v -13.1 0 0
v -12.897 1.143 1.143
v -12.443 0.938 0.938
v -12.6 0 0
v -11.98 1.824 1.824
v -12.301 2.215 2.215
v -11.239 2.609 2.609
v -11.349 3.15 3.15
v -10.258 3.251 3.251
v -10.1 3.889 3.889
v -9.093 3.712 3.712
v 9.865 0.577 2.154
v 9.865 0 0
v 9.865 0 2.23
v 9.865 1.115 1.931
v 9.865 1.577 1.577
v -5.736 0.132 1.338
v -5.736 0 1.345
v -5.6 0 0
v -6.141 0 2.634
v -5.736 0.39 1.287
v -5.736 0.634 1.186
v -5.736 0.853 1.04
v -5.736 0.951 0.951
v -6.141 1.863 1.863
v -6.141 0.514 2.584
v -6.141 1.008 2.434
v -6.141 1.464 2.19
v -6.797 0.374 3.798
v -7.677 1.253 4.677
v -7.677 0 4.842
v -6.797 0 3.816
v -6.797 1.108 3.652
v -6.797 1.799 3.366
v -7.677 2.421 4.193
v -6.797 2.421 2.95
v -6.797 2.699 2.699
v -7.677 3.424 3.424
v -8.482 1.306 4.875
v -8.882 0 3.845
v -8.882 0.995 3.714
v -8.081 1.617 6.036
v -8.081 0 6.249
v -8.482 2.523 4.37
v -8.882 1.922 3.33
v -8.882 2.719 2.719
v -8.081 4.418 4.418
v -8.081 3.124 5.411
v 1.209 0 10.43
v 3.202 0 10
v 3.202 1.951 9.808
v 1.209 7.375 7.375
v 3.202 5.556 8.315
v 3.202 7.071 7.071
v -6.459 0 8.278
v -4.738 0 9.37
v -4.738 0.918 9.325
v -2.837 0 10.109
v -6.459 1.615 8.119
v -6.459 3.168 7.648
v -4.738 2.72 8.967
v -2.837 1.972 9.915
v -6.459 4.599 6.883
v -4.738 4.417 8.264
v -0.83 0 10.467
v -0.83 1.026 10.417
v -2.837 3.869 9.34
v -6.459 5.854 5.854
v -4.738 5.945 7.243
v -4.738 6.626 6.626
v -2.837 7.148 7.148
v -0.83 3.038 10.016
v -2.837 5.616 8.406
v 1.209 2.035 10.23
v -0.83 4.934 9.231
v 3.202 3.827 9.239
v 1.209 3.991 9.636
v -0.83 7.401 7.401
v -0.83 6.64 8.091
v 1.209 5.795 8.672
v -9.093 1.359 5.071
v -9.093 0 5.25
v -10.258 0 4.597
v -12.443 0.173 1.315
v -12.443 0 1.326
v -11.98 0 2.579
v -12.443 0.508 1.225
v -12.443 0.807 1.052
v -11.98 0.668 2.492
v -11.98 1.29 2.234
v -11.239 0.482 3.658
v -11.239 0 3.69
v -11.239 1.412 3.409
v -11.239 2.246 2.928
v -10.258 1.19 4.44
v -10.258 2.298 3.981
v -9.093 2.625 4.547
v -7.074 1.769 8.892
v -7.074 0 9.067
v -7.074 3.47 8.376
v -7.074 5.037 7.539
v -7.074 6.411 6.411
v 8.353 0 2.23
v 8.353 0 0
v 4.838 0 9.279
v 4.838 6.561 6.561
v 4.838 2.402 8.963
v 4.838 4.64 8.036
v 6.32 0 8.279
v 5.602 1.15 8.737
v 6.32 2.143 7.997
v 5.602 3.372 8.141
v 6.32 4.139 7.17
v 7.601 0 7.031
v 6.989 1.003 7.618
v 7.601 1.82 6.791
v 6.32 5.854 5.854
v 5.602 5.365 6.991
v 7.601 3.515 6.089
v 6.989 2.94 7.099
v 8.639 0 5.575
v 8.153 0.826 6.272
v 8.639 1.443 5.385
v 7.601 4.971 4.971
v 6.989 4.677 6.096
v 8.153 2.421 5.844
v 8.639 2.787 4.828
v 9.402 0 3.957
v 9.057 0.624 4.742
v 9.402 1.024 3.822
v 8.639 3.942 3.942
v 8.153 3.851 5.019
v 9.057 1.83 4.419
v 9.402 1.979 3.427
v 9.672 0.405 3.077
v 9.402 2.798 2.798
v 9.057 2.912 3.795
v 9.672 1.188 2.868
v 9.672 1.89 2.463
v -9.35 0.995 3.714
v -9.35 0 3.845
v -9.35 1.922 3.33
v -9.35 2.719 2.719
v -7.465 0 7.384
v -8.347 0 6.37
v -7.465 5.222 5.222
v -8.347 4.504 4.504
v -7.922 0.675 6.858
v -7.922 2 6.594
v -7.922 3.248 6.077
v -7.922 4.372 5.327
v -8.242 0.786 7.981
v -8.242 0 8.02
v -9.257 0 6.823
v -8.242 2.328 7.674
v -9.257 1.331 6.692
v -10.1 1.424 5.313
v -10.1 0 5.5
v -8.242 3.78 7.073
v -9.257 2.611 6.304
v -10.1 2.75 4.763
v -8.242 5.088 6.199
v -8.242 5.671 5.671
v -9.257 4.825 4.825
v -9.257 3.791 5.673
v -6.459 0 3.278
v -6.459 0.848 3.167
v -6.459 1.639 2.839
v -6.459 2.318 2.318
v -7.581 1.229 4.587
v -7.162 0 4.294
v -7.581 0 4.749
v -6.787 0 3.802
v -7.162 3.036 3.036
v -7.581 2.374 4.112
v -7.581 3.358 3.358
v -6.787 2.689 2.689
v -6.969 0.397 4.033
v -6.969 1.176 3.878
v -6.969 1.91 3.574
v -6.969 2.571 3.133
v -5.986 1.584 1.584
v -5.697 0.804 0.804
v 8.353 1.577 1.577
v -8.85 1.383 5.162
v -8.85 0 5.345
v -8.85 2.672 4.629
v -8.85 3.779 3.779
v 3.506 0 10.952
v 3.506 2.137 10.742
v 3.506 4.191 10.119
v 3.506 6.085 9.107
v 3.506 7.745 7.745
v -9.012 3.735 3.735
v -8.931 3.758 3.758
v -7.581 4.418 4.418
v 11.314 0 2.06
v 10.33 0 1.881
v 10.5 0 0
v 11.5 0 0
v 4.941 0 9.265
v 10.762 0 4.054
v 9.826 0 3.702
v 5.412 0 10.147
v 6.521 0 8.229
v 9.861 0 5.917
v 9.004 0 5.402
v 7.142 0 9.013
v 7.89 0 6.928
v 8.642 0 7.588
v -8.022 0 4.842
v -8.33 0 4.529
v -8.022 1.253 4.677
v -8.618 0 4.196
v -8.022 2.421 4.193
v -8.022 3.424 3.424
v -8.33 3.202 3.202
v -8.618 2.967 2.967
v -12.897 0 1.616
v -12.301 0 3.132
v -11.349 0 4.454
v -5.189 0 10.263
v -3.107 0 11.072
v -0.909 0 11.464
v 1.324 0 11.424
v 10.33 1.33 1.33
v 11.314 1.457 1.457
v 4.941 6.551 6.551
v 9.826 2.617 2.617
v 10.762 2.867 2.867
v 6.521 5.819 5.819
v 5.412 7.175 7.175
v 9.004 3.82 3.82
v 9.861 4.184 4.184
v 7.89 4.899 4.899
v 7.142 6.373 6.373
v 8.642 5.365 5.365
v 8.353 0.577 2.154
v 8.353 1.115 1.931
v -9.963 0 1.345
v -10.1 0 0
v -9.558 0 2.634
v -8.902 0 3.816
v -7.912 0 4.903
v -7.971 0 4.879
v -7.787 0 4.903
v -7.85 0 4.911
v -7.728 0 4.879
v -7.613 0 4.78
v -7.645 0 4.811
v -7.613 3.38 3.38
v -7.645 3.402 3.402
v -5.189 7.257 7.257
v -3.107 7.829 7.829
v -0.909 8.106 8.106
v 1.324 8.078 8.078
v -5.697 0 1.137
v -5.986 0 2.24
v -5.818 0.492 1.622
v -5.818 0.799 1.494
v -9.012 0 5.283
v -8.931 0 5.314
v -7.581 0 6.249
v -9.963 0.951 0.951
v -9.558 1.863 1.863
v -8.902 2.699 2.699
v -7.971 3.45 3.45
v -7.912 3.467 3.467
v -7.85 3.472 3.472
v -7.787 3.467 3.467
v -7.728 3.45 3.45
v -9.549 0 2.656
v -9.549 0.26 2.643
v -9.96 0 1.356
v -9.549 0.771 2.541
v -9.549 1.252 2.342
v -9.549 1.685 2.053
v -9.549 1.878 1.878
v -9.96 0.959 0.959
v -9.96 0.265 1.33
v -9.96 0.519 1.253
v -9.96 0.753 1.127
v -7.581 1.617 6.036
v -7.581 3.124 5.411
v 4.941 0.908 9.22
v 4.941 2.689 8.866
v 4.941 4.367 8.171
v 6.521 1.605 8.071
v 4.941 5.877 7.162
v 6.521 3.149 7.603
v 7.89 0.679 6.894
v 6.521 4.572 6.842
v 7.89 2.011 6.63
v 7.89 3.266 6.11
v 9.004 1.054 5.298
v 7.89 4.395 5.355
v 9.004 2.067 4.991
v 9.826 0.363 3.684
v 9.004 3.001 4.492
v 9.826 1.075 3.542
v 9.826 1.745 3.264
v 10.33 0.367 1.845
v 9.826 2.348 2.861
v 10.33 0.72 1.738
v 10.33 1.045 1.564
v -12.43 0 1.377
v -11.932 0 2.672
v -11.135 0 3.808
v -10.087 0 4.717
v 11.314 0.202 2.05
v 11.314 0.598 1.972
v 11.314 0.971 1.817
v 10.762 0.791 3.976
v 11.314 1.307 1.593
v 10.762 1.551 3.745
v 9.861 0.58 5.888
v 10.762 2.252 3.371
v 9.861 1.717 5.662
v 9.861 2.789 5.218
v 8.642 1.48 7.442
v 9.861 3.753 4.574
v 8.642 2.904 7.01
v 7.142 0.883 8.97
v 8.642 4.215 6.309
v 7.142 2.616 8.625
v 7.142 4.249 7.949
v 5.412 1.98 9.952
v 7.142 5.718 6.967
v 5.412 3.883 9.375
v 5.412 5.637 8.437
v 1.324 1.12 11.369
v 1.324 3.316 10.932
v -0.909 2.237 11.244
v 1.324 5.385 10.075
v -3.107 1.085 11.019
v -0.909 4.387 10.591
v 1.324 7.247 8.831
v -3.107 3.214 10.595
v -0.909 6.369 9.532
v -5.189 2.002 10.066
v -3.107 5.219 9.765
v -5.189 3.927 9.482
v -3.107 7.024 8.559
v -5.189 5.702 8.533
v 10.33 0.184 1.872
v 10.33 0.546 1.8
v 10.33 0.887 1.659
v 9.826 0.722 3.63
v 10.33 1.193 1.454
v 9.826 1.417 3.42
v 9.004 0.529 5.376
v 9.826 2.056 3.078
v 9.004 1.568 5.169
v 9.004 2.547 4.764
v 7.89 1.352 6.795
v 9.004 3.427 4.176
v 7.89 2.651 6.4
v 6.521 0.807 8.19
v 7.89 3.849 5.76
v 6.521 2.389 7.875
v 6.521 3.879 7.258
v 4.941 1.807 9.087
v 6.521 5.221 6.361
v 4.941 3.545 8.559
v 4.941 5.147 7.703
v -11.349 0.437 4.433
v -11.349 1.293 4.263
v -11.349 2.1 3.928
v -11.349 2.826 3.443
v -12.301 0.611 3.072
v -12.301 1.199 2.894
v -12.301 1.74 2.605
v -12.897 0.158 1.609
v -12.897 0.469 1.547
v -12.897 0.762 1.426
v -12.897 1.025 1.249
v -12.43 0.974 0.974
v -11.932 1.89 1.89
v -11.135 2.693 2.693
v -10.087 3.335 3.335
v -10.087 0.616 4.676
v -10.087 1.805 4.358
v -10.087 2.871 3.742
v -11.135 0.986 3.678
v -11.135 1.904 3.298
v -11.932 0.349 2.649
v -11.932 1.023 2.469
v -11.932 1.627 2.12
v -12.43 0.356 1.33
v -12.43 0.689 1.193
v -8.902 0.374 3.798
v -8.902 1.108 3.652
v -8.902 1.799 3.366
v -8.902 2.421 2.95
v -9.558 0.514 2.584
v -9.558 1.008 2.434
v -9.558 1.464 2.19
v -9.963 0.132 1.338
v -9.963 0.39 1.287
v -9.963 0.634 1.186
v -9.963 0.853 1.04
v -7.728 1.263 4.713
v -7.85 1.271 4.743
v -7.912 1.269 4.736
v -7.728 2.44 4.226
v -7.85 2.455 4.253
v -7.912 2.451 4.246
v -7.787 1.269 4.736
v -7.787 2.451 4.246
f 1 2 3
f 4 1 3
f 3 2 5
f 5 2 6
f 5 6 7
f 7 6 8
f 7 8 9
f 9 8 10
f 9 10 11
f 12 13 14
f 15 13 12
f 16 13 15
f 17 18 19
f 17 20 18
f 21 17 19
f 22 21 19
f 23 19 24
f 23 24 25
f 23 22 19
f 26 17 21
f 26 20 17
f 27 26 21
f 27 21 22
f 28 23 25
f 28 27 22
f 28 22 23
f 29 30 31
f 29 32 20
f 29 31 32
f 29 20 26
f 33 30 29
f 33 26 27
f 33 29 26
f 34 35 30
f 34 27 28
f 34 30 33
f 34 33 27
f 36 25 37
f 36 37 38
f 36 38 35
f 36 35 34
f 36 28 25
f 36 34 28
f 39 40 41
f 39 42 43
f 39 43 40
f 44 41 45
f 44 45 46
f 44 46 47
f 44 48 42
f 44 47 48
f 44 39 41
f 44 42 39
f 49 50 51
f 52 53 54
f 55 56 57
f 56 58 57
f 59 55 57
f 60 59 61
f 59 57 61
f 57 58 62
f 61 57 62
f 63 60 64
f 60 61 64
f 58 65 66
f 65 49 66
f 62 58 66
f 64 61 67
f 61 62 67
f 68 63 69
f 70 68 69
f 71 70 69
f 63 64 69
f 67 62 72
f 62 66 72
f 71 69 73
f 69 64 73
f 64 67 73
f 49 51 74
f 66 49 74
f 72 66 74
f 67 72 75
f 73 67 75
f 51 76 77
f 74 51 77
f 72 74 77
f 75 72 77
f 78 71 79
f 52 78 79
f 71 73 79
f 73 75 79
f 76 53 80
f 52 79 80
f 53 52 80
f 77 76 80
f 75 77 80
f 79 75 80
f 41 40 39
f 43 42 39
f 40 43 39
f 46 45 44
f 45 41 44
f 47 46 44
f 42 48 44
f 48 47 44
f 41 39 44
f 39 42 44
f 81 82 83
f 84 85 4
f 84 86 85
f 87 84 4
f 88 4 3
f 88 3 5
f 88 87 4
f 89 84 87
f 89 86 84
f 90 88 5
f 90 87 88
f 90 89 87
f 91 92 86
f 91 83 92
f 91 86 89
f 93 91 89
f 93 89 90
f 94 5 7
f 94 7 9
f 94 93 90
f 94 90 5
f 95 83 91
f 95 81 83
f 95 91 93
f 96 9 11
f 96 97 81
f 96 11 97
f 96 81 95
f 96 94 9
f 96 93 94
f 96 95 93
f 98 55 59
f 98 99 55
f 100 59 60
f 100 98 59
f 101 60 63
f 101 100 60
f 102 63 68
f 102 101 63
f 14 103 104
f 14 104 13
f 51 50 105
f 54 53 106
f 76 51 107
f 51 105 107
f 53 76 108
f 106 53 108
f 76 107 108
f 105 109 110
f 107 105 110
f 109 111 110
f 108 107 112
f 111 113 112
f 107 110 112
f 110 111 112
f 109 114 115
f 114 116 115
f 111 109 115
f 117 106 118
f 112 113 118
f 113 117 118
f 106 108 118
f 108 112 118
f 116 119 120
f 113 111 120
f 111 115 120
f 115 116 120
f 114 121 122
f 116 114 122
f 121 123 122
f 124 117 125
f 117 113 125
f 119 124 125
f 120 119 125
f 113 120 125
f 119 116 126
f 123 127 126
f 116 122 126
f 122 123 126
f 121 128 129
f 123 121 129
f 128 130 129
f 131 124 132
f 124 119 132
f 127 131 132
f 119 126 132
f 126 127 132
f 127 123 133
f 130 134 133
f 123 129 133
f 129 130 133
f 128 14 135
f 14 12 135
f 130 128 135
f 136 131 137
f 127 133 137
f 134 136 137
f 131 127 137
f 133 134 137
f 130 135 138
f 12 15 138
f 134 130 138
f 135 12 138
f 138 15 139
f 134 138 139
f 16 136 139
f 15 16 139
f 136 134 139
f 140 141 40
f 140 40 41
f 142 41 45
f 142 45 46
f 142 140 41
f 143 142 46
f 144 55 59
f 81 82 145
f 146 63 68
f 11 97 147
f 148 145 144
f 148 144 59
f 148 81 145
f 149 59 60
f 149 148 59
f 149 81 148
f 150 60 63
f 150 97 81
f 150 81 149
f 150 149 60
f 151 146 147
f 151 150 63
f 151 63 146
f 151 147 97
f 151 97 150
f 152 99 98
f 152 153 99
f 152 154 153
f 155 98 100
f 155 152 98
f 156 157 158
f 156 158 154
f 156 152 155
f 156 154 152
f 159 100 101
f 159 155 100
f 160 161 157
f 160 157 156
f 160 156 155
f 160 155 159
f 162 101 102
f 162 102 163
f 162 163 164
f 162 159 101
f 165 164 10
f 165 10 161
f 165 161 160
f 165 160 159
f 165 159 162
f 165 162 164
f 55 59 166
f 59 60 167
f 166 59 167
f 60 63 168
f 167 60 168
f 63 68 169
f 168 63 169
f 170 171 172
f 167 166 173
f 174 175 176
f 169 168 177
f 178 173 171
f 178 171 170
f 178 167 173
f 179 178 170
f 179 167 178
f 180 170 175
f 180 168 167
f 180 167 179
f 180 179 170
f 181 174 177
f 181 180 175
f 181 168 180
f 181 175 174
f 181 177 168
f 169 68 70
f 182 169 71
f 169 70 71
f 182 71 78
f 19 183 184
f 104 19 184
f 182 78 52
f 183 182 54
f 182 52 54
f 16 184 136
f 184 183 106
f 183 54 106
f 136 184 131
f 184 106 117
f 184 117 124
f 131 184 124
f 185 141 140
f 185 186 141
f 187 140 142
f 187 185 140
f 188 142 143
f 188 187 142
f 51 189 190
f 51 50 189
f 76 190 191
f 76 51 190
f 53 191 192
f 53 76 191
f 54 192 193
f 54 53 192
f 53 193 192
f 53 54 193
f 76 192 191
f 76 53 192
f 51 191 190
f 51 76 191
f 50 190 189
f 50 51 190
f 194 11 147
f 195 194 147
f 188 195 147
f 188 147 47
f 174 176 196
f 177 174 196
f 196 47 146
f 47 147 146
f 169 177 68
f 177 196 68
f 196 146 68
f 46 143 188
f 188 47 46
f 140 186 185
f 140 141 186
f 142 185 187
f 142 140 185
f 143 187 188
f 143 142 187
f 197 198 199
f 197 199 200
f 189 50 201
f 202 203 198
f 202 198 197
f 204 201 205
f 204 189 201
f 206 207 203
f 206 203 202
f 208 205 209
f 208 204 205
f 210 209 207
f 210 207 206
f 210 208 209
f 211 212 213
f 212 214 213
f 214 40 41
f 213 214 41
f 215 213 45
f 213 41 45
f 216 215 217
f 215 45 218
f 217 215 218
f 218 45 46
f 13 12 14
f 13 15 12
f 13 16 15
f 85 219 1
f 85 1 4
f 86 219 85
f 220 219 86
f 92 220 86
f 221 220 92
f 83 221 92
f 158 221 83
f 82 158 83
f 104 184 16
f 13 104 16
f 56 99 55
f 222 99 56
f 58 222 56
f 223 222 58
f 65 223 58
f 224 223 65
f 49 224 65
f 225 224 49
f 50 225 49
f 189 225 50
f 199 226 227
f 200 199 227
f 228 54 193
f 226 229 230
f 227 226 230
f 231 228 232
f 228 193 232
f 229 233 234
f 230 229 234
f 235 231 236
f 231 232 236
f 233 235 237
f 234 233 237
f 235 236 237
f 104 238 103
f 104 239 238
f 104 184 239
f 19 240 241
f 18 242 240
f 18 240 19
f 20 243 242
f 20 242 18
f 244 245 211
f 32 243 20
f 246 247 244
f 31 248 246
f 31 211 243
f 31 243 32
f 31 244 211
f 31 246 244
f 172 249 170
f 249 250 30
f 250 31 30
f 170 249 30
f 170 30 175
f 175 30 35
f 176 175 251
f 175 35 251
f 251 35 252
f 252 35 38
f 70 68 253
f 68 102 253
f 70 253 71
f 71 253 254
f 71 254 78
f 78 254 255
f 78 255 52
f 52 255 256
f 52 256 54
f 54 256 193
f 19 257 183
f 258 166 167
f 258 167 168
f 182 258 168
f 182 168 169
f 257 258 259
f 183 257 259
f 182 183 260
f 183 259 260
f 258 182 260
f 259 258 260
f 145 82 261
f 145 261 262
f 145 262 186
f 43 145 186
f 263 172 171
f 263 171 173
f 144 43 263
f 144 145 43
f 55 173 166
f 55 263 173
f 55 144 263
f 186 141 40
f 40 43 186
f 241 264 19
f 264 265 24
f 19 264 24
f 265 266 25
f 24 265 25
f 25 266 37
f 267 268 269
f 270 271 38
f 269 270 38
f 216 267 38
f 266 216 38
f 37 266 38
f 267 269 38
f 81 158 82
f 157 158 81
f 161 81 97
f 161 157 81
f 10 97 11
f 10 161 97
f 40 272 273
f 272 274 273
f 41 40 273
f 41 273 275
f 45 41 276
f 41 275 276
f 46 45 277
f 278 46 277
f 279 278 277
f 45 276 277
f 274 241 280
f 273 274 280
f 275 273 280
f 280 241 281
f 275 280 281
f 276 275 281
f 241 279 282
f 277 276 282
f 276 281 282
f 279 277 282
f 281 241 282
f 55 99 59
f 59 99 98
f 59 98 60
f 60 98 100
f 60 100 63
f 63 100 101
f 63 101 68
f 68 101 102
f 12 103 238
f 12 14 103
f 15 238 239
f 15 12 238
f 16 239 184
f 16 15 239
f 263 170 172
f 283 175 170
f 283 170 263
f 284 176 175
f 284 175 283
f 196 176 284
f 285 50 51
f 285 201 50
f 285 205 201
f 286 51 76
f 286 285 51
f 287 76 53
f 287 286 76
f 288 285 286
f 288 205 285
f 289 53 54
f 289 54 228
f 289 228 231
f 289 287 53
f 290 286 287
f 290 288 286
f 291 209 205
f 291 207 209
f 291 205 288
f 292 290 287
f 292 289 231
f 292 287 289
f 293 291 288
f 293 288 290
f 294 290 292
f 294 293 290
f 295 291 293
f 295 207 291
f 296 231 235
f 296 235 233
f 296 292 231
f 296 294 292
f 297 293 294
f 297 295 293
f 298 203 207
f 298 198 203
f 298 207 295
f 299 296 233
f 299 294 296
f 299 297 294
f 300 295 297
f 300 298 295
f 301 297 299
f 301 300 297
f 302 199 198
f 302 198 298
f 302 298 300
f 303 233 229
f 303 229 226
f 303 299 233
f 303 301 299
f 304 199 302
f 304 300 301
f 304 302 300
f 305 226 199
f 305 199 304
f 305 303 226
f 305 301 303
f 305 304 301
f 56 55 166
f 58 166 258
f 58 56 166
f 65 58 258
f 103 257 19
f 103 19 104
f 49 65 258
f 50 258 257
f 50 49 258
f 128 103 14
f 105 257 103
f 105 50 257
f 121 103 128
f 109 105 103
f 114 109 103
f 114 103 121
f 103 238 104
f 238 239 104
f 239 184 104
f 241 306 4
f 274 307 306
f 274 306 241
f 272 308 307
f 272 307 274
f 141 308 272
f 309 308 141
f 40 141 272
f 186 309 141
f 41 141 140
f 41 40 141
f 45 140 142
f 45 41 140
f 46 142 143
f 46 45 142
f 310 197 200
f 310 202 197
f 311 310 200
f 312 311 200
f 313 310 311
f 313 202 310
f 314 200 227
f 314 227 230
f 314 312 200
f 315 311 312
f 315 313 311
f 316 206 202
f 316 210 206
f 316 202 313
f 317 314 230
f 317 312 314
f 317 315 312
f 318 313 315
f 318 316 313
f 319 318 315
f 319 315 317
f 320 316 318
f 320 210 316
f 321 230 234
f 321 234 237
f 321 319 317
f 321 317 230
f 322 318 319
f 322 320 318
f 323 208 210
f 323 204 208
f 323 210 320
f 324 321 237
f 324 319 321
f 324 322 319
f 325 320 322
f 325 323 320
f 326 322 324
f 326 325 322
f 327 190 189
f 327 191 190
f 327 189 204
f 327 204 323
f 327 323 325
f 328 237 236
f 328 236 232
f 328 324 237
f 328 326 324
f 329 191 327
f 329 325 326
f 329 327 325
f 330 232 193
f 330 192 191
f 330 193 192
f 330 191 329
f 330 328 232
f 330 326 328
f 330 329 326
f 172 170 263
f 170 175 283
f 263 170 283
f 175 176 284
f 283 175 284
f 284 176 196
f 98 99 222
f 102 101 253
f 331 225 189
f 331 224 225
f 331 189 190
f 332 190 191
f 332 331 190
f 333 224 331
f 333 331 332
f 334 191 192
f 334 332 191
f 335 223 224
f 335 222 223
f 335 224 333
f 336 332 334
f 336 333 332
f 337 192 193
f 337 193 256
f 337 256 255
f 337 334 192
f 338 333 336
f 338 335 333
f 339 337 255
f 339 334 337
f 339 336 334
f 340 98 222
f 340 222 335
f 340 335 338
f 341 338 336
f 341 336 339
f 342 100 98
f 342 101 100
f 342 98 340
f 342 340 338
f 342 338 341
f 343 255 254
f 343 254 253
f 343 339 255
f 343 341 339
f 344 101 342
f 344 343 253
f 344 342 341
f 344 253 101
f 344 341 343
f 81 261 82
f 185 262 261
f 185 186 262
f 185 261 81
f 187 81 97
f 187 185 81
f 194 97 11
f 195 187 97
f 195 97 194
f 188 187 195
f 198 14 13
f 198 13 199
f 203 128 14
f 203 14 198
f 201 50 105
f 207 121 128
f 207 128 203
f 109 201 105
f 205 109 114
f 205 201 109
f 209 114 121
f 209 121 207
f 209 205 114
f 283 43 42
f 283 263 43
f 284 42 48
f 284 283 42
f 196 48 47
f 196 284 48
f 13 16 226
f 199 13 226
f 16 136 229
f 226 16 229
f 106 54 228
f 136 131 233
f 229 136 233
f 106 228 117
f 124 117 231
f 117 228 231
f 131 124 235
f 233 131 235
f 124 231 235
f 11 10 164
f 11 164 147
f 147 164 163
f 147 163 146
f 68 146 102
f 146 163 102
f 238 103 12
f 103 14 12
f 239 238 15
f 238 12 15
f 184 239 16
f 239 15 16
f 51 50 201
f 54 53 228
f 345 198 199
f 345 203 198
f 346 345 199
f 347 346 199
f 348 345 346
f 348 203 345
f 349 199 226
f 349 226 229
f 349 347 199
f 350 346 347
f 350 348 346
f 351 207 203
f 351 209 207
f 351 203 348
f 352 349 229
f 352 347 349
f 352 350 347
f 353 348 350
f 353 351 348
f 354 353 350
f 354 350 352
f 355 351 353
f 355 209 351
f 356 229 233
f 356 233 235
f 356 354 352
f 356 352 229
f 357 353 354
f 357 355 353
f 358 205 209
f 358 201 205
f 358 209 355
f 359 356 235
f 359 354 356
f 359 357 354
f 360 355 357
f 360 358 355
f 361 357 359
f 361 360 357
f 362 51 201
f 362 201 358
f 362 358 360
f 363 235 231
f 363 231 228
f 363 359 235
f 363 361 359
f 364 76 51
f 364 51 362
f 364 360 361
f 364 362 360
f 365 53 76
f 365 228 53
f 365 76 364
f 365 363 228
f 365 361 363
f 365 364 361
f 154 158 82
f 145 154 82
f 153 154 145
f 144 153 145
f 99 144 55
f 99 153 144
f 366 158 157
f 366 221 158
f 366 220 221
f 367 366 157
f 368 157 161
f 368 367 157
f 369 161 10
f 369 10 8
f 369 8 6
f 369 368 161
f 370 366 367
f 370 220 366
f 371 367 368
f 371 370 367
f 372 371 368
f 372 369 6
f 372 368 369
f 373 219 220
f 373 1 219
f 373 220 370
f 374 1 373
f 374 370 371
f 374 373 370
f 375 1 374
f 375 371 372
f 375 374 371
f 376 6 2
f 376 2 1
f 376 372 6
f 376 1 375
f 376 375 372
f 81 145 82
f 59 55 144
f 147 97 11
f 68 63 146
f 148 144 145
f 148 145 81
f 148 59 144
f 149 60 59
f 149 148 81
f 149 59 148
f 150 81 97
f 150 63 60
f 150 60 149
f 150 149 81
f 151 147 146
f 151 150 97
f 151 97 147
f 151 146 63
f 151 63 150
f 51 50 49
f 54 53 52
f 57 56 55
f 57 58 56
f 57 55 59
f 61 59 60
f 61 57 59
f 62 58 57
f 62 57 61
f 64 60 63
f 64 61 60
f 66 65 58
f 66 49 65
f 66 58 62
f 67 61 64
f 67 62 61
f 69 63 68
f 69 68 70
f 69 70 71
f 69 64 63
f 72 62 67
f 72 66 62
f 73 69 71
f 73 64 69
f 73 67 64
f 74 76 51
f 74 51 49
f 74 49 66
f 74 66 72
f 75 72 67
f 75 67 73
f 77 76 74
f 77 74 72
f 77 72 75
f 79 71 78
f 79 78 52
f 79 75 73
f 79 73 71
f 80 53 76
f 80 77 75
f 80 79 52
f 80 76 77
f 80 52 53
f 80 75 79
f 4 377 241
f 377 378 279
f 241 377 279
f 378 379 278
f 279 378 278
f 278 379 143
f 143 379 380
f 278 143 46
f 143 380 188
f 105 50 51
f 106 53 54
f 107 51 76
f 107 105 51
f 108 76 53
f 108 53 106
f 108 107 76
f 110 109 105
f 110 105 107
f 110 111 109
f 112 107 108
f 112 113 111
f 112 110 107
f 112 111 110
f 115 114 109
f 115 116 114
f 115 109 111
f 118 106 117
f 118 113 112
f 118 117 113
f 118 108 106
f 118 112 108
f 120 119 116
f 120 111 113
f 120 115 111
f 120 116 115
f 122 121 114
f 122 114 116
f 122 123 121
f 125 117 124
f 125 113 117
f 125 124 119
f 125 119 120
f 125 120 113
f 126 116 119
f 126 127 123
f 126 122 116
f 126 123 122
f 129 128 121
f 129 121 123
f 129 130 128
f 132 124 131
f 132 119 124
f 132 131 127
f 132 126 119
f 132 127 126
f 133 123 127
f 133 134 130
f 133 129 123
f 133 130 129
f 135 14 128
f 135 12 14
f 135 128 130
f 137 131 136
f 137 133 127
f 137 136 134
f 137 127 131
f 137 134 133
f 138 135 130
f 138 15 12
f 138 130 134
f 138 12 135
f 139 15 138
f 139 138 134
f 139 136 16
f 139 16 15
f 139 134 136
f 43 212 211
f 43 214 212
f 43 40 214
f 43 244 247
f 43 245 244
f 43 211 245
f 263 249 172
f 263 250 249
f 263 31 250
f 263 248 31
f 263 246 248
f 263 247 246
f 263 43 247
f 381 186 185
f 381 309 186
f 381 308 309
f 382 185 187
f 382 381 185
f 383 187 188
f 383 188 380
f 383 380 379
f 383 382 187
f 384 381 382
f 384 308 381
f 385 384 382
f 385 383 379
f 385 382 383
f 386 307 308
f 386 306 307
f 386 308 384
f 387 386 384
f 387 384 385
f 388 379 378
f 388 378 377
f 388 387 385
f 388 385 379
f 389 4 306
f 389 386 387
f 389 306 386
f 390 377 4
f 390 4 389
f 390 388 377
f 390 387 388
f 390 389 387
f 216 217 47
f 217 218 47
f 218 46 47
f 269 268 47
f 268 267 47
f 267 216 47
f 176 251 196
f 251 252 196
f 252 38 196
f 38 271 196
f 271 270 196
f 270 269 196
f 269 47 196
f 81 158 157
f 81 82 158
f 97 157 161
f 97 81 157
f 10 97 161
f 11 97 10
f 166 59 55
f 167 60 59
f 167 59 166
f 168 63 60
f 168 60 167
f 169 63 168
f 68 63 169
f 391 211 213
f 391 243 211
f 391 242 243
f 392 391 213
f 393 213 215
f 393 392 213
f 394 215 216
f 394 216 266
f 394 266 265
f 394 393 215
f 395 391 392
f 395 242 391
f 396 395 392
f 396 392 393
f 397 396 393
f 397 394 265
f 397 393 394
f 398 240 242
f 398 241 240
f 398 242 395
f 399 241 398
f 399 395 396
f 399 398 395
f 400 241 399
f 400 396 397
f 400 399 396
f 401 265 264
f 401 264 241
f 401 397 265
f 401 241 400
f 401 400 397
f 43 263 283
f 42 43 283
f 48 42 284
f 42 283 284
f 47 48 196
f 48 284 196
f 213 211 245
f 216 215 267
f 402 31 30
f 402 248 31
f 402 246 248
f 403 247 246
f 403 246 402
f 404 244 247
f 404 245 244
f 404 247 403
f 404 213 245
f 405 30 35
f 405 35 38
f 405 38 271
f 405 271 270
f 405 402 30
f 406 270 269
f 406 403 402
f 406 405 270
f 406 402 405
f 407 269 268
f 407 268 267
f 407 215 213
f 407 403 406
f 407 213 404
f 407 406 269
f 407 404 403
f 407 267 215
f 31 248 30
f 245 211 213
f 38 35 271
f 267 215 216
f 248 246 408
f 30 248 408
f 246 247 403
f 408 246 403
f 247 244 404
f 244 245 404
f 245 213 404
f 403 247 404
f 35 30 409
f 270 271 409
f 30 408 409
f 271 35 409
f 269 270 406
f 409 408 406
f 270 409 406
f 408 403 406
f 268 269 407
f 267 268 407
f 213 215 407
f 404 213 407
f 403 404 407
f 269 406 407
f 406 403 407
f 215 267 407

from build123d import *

# Parameters (mm, degrees)
F1_ANGLE  = 45
F3_ANGLE  = 45
F4_ANGLE  = 45
F6_ANGLE  = 45
F7_ANGLE  = 45
F9_ANGLE  = 45
F10_ANGLE = 45
F11_W     = 1.51221
F11_H     = 2.23
F12_ANGLE = 45
F13_ANGLE = 45
F15_ANGLE = 45
F16_ANGLE = 45
F19_ANGLE = 45
F22_ANGLE = 45
F25_ANGLE = 45
F28_ANGLE = 45
F31_ANGLE = 45


with BuildPart() as f1:
    # F0 (on Front) → F1 (revolve)
    with BuildSketch(Plane.XZ):
        with BuildLine():
            Line((-11.5, 0), (11.5, 0))
            ThreePointArc((11.5, 0), (2.8377537956, 11.1443776585), (-10.0995049384, 5.5))
            ThreePointArc((-10.0995049384, 5.5), (-12.3007384778, 3.1324910215), (-13.0995049384, 0))
            Line((-13.0995049384, 0), (-11.5, 0))
        make_face()
    revolve(axis=Axis((0, 0, 0), (-1, 0, 0)), revolution_arc=F1_ANGLE)

    # F2 (on Front) → F3 (revolve, cut)
    with BuildSketch(Plane.XZ):
        with BuildLine():
            ThreePointArc((11.5, 0), (2.8377537956, 11.1443776585), (-10.0995049384, 5.5))
            Line((-10.0995049384, 5.5), (-9.0932667397, 5.25))
            ThreePointArc((-9.0932667397, 5.25), (2.7175999736, 10.142221176), (10.5, 0))
            Line((10.5, 0), (11.5, 0))
        make_face()
    revolve(axis=Axis((0, 0, 0), (-1, 0, 0)), revolution_arc=F3_ANGLE, mode=Mode.SUBTRACT)

    # F5 (on face) → F6 (revolve, cut)
    with BuildSketch(Plane.XZ):
        with BuildLine():
            ThreePointArc((-12.5995049384, 0), (-11.6423500551, 3.1565885979), (-9.0932667397, 5.25))
            Line((-9.0932667397, 5.25), (-10.0995049384, 5.5))
            ThreePointArc((-10.0995049384, 5.5), (-12.3007384778, 3.1324910215), (-13.0995049384, 0))
            Line((-13.0995049384, 0), (-12.5995049384, 0))
        make_face()
    revolve(axis=Axis((-12.2997524692, 0, 0), (-1, 0, 0)), revolution_arc=F6_ANGLE, mode=Mode.SUBTRACT)

    # F8 (on Front) → F9 (revolve, cut)
    with BuildSketch(Plane.XZ):
        with BuildLine():
            ThreePointArc((3.2015621187, 10), (8.2807192075, 6.1420955145), (10, 0))
            Line((10, 0), (10.5, 0))
            ThreePointArc((10.5, 0), (8.4813442993, 6.1900564518), (3.2015621187, 10))
        make_face()
    revolve(axis=Axis((0, 0, 0), (-1, 0, 0)), revolution_arc=F9_ANGLE, mode=Mode.SUBTRACT)

    # F11 (on face) → F12 (revolve, cut)
    with BuildSketch(Plane.XZ):
        with Locations((9.1086225685, 1.115)):
            Rectangle(F11_W, F11_H)
    revolve(axis=Axis((9.1086225685, 0, 0), (-1, 0, 0)), revolution_arc=F12_ANGLE, mode=Mode.SUBTRACT)

    # F14 (on Front) → F15 (revolve, cut)
    with BuildSketch(Plane.XZ):
        with BuildLine():
            ThreePointArc((10, 0), (9.9947523902, 1.1187845105), (9.8647275685, 2.23))
            Line((9.8647275685, 2.23), (9.8647275685, 0))
            Line((9.8647275685, 0), (10, 0))
        make_face()
    revolve(axis=Axis((9.9323637842, 0, 0), (-1, 0, 0)), revolution_arc=F15_ANGLE, mode=Mode.SUBTRACT)

    # F20 (on Front) → F21 (revolve, cut)
    with BuildSketch(Plane.XZ):
        with BuildLine():
            Line((-9.3495049384, 3.8445862413), (-8.8495049384, 5.3445862413))
            ThreePointArc((-8.8495049384, 5.3445862413), (-11.5684914777, 3.2644717065), (-12.5995049384, 0))
            Line((-12.5995049384, 0), (-8.8495049384, 0))
            Line((-8.8495049384, 0), (-8.8495049384, 3.8445862413))
            Line((-8.8495049384, 3.8445862413), (-9.3495049384, 3.8445862413))
        make_face()
    revolve(axis=Axis((-10.7245049384, 0, 0), (1, 0, 0)), mode=Mode.SUBTRACT)


with BuildPart() as f4:
    # F2 (on Front) → F4 (revolve)
    with BuildSketch(Plane.XZ):
        with BuildLine():
            ThreePointArc((11.5, 0), (2.8377537956, 11.1443776585), (-10.0995049384, 5.5))
            Line((-10.0995049384, 5.5), (-9.0932667397, 5.25))
            ThreePointArc((-9.0932667397, 5.25), (2.7175999736, 10.142221176), (10.5, 0))
            Line((10.5, 0), (11.5, 0))
        make_face()
    revolve(axis=Axis((0, 0, 0), (-1, 0, 0)), revolution_arc=F4_ANGLE)

    # F17 (on Front) → F18 (revolve, cut)
    with BuildSketch(Plane.XZ):
        with BuildLine():
            ThreePointArc((11.5, 0), (9.2890913754, 6.7795856377), (3.5064727967, 10.9523809524))
            Line((3.5064727967, 10.9523809524), (3.2015621187, 10))
            ThreePointArc((3.2015621187, 10), (8.4813442993, 6.1900564518), (10.5, 0))
            Line((10.5, 0), (11.5, 0))
        make_face()
    revolve(axis=Axis((11, 0, 0), (1, 0, 0)), mode=Mode.SUBTRACT)

    # F29 (on Front) → F30 (revolve, cut)
    with BuildSketch(Plane.XZ):
        with BuildLine():
            ThreePointArc((-9.0932667397, 5.25), (-7.9222484154, 6.8911523017), (-6.4591549508, 8.2782436134))
            Line((-6.4591549508, 8.2782436134), (-7.0743125651, 9.066647767))
            ThreePointArc((-7.0743125651, 9.066647767), (-8.7701337495, 7.438733361), (-10.0995049384, 5.5))
            Line((-10.0995049384, 5.5), (-9.0932667397, 5.25))
        make_face()
    revolve(axis=Axis((-7.8495049384, 0, 0), (-1, 0, 0)), mode=Mode.SUBTRACT)


with BuildPart() as f7:
    # F5 (on face) → F7 (revolve)
    with BuildSketch(Plane.XZ):
        with BuildLine():
            ThreePointArc((-12.5995049384, 0), (-11.6423500551, 3.1565885979), (-9.0932667397, 5.25))
            Line((-9.0932667397, 5.25), (-10.0995049384, 5.5))
            ThreePointArc((-10.0995049384, 5.5), (-12.3007384778, 3.1324910215), (-13.0995049384, 0))
            Line((-13.0995049384, 0), (-12.5995049384, 0))
        make_face()
    revolve(axis=Axis((0, 0, 0), (-1, 0, 0)), revolution_arc=F7_ANGLE)


with BuildPart() as f10:
    # F8 (on Front) → F10 (revolve)
    with BuildSketch(Plane.XZ):
        with BuildLine():
            ThreePointArc((3.2015621187, 10), (8.2807192075, 6.1420955145), (10, 0))
            Line((10, 0), (10.5, 0))
            ThreePointArc((10.5, 0), (8.4813442993, 6.1900564518), (3.2015621187, 10))
        make_face()
    revolve(axis=Axis((10.25, 0, 0), (-1, 0, 0)), revolution_arc=F10_ANGLE)

    # F14 (on Front) → F16 (revolve)
    with BuildSketch(Plane.XZ):
        with BuildLine():
            ThreePointArc((10, 0), (9.9947523902, 1.1187845105), (9.8647275685, 2.23))
            Line((9.8647275685, 2.23), (9.8647275685, 0))
            Line((9.8647275685, 0), (10, 0))
        make_face()
    revolve(axis=Axis((0, 0, 0), (-1, 0, 0)), revolution_arc=F16_ANGLE)


with BuildPart() as f13:
    # F11 (on face) → F13 (revolve)
    with BuildSketch(Plane.XZ):
        with Locations((9.1086225685, 1.115)):
            Rectangle(F11_W, F11_H)
    revolve(axis=Axis((0, 0, 0), (-1, 0, 0)), revolution_arc=F13_ANGLE)


with BuildPart() as f19:
    # F17 (on Front) → F19 (revolve)
    with BuildSketch(Plane.XZ):
        with BuildLine():
            ThreePointArc((11.5, 0), (9.2890913754, 6.7795856377), (3.5064727967, 10.9523809524))
            Line((3.5064727967, 10.9523809524), (3.2015621187, 10))
            ThreePointArc((3.2015621187, 10), (8.4813442993, 6.1900564518), (10.5, 0))
            Line((10.5, 0), (11.5, 0))
        make_face()
    revolve(axis=Axis((0, 0, 0), (-1, 0, 0)), revolution_arc=F19_ANGLE)


with BuildPart() as f22:
    # F20 (on Front) → F22 (revolve)
    with BuildSketch(Plane.XZ):
        with BuildLine():
            Line((-9.3495049384, 3.8445862413), (-8.8495049384, 5.3445862413))
            ThreePointArc((-8.8495049384, 5.3445862413), (-11.5684914777, 3.2644717065), (-12.5995049384, 0))
            Line((-12.5995049384, 0), (-8.8495049384, 0))
            Line((-8.8495049384, 0), (-8.8495049384, 3.8445862413))
            Line((-8.8495049384, 3.8445862413), (-9.3495049384, 3.8445862413))
        make_face()
    revolve(axis=Axis((0, 0, 0), (-1, 0, 0)), revolution_arc=F22_ANGLE)


with BuildPart() as f24_tool:
    # F23 (on Front) → F24 (revolve)
    with BuildSketch(Plane.XZ):
        with BuildLine():
            Line((-10.0995049384, 0), (-5.5995049384, 0))
            ThreePointArc((-5.5995049384, 0), (-6.1408791354, 2.6344401261), (-7.6772587181, 4.8419044128))
            ThreePointArc((-7.6772587181, 4.8419044128), (-7.8495049384, 4.9107104847), (-8.0217511587, 4.8419044128))
            ThreePointArc((-8.0217511587, 4.8419044128), (-9.5581307413, 2.6344401261), (-10.0995049384, 0))
        make_face()
    revolve(axis=Axis((0, 0, 0), (-1, 0, 0)))


with BuildPart() as f1_1:
    add(f1.part)

    # F24: cut by f24_tool
    add(f24_tool.part, mode=Mode.SUBTRACT)

    # F26 (on Front) → F27 (revolve, cut)
    with BuildSketch(Plane.XZ):
        with BuildLine():
            Line((-8.8495049384, 5.3445862413), (-9.3495049384, 3.8445862413))
            Line((-9.3495049384, 3.8445862413), (-8.8823713109, 3.8445862413))
            Line((-8.8823713109, 3.8445862413), (-8.0810395972, 6.2485813822))
            Line((-8.0810395972, 6.2485813822), (-7.5810395972, 6.2485813822))
            Line((-7.5810395972, 6.2485813822), (-7.5810395972, 4.7485813822))
            ThreePointArc((-7.5810395972, 4.7485813822), (-6.9689696113, 4.0524234931), (-6.4591549508, 3.2782436134))
            Line((-6.4591549508, 3.2782436134), (-6.4591549508, 8.2782436134))
            ThreePointArc((-6.4591549508, 8.2782436134), (-7.9222484154, 6.8911523017), (-9.0932667397, 5.25))
            ThreePointArc((-9.0932667397, 5.25), (-8.9719298306, 5.298695062), (-8.8495049384, 5.3445862413))
        make_face()
    revolve(axis=Axis((-7.8495049384, 0, 0), (-1, 0, 0)), mode=Mode.SUBTRACT)


with BuildPart() as f22_1:
    add(f22.part)

    # F24: cut by f24_tool
    add(f24_tool.part, mode=Mode.SUBTRACT)


with BuildPart() as f25:
    # F23 (on Front) → F25 (revolve)
    with BuildSketch(Plane.XZ):
        with BuildLine():
            Line((-10.0995049384, 0), (-5.5995049384, 0))
            ThreePointArc((-5.5995049384, 0), (-6.1408791354, 2.6344401261), (-7.6772587181, 4.8419044128))
            ThreePointArc((-7.6772587181, 4.8419044128), (-7.8495049384, 4.9107104847), (-8.0217511587, 4.8419044128))
            ThreePointArc((-8.0217511587, 4.8419044128), (-9.5581307413, 2.6344401261), (-10.0995049384, 0))
        make_face()
    revolve(axis=Axis((0, 0, 0), (-1, 0, 0)), revolution_arc=F25_ANGLE)


with BuildPart() as f28:
    # F26 (on Front) → F28 (revolve)
    with BuildSketch(Plane.XZ):
        with BuildLine():
            Line((-8.8495049384, 5.3445862413), (-9.3495049384, 3.8445862413))
            Line((-9.3495049384, 3.8445862413), (-8.8823713109, 3.8445862413))
            Line((-8.8823713109, 3.8445862413), (-8.0810395972, 6.2485813822))
            Line((-8.0810395972, 6.2485813822), (-7.5810395972, 6.2485813822))
            Line((-7.5810395972, 6.2485813822), (-7.5810395972, 4.7485813822))
            ThreePointArc((-7.5810395972, 4.7485813822), (-6.9689696113, 4.0524234931), (-6.4591549508, 3.2782436134))
            Line((-6.4591549508, 3.2782436134), (-6.4591549508, 8.2782436134))
            ThreePointArc((-6.4591549508, 8.2782436134), (-7.9222484154, 6.8911523017), (-9.0932667397, 5.25))
            ThreePointArc((-9.0932667397, 5.25), (-8.9719298306, 5.298695062), (-8.8495049384, 5.3445862413))
        make_face()
    revolve(axis=Axis((-7.8495049384, 0, 0), (-1, 0, 0)), revolution_arc=F28_ANGLE)


with BuildPart() as f31:
    # F29 (on Front) → F31 (revolve)
    with BuildSketch(Plane.XZ):
        with BuildLine():
            ThreePointArc((-9.0932667397, 5.25), (-7.9222484154, 6.8911523017), (-6.4591549508, 8.2782436134))
            Line((-6.4591549508, 8.2782436134), (-7.0743125651, 9.066647767))
            ThreePointArc((-7.0743125651, 9.066647767), (-8.7701337495, 7.438733361), (-10.0995049384, 5.5))
            Line((-10.0995049384, 5.5), (-9.0932667397, 5.25))
        make_face()
    revolve(axis=Axis((-7.8495049384, 0, 0), (-1, 0, 0)), revolution_arc=F31_ANGLE)


solid = Compound([f4.part, f7.part, f10.part, f13.part, f19.part, f1_1.part, f22_1.part, f25.part, f28.part, f31.part])
